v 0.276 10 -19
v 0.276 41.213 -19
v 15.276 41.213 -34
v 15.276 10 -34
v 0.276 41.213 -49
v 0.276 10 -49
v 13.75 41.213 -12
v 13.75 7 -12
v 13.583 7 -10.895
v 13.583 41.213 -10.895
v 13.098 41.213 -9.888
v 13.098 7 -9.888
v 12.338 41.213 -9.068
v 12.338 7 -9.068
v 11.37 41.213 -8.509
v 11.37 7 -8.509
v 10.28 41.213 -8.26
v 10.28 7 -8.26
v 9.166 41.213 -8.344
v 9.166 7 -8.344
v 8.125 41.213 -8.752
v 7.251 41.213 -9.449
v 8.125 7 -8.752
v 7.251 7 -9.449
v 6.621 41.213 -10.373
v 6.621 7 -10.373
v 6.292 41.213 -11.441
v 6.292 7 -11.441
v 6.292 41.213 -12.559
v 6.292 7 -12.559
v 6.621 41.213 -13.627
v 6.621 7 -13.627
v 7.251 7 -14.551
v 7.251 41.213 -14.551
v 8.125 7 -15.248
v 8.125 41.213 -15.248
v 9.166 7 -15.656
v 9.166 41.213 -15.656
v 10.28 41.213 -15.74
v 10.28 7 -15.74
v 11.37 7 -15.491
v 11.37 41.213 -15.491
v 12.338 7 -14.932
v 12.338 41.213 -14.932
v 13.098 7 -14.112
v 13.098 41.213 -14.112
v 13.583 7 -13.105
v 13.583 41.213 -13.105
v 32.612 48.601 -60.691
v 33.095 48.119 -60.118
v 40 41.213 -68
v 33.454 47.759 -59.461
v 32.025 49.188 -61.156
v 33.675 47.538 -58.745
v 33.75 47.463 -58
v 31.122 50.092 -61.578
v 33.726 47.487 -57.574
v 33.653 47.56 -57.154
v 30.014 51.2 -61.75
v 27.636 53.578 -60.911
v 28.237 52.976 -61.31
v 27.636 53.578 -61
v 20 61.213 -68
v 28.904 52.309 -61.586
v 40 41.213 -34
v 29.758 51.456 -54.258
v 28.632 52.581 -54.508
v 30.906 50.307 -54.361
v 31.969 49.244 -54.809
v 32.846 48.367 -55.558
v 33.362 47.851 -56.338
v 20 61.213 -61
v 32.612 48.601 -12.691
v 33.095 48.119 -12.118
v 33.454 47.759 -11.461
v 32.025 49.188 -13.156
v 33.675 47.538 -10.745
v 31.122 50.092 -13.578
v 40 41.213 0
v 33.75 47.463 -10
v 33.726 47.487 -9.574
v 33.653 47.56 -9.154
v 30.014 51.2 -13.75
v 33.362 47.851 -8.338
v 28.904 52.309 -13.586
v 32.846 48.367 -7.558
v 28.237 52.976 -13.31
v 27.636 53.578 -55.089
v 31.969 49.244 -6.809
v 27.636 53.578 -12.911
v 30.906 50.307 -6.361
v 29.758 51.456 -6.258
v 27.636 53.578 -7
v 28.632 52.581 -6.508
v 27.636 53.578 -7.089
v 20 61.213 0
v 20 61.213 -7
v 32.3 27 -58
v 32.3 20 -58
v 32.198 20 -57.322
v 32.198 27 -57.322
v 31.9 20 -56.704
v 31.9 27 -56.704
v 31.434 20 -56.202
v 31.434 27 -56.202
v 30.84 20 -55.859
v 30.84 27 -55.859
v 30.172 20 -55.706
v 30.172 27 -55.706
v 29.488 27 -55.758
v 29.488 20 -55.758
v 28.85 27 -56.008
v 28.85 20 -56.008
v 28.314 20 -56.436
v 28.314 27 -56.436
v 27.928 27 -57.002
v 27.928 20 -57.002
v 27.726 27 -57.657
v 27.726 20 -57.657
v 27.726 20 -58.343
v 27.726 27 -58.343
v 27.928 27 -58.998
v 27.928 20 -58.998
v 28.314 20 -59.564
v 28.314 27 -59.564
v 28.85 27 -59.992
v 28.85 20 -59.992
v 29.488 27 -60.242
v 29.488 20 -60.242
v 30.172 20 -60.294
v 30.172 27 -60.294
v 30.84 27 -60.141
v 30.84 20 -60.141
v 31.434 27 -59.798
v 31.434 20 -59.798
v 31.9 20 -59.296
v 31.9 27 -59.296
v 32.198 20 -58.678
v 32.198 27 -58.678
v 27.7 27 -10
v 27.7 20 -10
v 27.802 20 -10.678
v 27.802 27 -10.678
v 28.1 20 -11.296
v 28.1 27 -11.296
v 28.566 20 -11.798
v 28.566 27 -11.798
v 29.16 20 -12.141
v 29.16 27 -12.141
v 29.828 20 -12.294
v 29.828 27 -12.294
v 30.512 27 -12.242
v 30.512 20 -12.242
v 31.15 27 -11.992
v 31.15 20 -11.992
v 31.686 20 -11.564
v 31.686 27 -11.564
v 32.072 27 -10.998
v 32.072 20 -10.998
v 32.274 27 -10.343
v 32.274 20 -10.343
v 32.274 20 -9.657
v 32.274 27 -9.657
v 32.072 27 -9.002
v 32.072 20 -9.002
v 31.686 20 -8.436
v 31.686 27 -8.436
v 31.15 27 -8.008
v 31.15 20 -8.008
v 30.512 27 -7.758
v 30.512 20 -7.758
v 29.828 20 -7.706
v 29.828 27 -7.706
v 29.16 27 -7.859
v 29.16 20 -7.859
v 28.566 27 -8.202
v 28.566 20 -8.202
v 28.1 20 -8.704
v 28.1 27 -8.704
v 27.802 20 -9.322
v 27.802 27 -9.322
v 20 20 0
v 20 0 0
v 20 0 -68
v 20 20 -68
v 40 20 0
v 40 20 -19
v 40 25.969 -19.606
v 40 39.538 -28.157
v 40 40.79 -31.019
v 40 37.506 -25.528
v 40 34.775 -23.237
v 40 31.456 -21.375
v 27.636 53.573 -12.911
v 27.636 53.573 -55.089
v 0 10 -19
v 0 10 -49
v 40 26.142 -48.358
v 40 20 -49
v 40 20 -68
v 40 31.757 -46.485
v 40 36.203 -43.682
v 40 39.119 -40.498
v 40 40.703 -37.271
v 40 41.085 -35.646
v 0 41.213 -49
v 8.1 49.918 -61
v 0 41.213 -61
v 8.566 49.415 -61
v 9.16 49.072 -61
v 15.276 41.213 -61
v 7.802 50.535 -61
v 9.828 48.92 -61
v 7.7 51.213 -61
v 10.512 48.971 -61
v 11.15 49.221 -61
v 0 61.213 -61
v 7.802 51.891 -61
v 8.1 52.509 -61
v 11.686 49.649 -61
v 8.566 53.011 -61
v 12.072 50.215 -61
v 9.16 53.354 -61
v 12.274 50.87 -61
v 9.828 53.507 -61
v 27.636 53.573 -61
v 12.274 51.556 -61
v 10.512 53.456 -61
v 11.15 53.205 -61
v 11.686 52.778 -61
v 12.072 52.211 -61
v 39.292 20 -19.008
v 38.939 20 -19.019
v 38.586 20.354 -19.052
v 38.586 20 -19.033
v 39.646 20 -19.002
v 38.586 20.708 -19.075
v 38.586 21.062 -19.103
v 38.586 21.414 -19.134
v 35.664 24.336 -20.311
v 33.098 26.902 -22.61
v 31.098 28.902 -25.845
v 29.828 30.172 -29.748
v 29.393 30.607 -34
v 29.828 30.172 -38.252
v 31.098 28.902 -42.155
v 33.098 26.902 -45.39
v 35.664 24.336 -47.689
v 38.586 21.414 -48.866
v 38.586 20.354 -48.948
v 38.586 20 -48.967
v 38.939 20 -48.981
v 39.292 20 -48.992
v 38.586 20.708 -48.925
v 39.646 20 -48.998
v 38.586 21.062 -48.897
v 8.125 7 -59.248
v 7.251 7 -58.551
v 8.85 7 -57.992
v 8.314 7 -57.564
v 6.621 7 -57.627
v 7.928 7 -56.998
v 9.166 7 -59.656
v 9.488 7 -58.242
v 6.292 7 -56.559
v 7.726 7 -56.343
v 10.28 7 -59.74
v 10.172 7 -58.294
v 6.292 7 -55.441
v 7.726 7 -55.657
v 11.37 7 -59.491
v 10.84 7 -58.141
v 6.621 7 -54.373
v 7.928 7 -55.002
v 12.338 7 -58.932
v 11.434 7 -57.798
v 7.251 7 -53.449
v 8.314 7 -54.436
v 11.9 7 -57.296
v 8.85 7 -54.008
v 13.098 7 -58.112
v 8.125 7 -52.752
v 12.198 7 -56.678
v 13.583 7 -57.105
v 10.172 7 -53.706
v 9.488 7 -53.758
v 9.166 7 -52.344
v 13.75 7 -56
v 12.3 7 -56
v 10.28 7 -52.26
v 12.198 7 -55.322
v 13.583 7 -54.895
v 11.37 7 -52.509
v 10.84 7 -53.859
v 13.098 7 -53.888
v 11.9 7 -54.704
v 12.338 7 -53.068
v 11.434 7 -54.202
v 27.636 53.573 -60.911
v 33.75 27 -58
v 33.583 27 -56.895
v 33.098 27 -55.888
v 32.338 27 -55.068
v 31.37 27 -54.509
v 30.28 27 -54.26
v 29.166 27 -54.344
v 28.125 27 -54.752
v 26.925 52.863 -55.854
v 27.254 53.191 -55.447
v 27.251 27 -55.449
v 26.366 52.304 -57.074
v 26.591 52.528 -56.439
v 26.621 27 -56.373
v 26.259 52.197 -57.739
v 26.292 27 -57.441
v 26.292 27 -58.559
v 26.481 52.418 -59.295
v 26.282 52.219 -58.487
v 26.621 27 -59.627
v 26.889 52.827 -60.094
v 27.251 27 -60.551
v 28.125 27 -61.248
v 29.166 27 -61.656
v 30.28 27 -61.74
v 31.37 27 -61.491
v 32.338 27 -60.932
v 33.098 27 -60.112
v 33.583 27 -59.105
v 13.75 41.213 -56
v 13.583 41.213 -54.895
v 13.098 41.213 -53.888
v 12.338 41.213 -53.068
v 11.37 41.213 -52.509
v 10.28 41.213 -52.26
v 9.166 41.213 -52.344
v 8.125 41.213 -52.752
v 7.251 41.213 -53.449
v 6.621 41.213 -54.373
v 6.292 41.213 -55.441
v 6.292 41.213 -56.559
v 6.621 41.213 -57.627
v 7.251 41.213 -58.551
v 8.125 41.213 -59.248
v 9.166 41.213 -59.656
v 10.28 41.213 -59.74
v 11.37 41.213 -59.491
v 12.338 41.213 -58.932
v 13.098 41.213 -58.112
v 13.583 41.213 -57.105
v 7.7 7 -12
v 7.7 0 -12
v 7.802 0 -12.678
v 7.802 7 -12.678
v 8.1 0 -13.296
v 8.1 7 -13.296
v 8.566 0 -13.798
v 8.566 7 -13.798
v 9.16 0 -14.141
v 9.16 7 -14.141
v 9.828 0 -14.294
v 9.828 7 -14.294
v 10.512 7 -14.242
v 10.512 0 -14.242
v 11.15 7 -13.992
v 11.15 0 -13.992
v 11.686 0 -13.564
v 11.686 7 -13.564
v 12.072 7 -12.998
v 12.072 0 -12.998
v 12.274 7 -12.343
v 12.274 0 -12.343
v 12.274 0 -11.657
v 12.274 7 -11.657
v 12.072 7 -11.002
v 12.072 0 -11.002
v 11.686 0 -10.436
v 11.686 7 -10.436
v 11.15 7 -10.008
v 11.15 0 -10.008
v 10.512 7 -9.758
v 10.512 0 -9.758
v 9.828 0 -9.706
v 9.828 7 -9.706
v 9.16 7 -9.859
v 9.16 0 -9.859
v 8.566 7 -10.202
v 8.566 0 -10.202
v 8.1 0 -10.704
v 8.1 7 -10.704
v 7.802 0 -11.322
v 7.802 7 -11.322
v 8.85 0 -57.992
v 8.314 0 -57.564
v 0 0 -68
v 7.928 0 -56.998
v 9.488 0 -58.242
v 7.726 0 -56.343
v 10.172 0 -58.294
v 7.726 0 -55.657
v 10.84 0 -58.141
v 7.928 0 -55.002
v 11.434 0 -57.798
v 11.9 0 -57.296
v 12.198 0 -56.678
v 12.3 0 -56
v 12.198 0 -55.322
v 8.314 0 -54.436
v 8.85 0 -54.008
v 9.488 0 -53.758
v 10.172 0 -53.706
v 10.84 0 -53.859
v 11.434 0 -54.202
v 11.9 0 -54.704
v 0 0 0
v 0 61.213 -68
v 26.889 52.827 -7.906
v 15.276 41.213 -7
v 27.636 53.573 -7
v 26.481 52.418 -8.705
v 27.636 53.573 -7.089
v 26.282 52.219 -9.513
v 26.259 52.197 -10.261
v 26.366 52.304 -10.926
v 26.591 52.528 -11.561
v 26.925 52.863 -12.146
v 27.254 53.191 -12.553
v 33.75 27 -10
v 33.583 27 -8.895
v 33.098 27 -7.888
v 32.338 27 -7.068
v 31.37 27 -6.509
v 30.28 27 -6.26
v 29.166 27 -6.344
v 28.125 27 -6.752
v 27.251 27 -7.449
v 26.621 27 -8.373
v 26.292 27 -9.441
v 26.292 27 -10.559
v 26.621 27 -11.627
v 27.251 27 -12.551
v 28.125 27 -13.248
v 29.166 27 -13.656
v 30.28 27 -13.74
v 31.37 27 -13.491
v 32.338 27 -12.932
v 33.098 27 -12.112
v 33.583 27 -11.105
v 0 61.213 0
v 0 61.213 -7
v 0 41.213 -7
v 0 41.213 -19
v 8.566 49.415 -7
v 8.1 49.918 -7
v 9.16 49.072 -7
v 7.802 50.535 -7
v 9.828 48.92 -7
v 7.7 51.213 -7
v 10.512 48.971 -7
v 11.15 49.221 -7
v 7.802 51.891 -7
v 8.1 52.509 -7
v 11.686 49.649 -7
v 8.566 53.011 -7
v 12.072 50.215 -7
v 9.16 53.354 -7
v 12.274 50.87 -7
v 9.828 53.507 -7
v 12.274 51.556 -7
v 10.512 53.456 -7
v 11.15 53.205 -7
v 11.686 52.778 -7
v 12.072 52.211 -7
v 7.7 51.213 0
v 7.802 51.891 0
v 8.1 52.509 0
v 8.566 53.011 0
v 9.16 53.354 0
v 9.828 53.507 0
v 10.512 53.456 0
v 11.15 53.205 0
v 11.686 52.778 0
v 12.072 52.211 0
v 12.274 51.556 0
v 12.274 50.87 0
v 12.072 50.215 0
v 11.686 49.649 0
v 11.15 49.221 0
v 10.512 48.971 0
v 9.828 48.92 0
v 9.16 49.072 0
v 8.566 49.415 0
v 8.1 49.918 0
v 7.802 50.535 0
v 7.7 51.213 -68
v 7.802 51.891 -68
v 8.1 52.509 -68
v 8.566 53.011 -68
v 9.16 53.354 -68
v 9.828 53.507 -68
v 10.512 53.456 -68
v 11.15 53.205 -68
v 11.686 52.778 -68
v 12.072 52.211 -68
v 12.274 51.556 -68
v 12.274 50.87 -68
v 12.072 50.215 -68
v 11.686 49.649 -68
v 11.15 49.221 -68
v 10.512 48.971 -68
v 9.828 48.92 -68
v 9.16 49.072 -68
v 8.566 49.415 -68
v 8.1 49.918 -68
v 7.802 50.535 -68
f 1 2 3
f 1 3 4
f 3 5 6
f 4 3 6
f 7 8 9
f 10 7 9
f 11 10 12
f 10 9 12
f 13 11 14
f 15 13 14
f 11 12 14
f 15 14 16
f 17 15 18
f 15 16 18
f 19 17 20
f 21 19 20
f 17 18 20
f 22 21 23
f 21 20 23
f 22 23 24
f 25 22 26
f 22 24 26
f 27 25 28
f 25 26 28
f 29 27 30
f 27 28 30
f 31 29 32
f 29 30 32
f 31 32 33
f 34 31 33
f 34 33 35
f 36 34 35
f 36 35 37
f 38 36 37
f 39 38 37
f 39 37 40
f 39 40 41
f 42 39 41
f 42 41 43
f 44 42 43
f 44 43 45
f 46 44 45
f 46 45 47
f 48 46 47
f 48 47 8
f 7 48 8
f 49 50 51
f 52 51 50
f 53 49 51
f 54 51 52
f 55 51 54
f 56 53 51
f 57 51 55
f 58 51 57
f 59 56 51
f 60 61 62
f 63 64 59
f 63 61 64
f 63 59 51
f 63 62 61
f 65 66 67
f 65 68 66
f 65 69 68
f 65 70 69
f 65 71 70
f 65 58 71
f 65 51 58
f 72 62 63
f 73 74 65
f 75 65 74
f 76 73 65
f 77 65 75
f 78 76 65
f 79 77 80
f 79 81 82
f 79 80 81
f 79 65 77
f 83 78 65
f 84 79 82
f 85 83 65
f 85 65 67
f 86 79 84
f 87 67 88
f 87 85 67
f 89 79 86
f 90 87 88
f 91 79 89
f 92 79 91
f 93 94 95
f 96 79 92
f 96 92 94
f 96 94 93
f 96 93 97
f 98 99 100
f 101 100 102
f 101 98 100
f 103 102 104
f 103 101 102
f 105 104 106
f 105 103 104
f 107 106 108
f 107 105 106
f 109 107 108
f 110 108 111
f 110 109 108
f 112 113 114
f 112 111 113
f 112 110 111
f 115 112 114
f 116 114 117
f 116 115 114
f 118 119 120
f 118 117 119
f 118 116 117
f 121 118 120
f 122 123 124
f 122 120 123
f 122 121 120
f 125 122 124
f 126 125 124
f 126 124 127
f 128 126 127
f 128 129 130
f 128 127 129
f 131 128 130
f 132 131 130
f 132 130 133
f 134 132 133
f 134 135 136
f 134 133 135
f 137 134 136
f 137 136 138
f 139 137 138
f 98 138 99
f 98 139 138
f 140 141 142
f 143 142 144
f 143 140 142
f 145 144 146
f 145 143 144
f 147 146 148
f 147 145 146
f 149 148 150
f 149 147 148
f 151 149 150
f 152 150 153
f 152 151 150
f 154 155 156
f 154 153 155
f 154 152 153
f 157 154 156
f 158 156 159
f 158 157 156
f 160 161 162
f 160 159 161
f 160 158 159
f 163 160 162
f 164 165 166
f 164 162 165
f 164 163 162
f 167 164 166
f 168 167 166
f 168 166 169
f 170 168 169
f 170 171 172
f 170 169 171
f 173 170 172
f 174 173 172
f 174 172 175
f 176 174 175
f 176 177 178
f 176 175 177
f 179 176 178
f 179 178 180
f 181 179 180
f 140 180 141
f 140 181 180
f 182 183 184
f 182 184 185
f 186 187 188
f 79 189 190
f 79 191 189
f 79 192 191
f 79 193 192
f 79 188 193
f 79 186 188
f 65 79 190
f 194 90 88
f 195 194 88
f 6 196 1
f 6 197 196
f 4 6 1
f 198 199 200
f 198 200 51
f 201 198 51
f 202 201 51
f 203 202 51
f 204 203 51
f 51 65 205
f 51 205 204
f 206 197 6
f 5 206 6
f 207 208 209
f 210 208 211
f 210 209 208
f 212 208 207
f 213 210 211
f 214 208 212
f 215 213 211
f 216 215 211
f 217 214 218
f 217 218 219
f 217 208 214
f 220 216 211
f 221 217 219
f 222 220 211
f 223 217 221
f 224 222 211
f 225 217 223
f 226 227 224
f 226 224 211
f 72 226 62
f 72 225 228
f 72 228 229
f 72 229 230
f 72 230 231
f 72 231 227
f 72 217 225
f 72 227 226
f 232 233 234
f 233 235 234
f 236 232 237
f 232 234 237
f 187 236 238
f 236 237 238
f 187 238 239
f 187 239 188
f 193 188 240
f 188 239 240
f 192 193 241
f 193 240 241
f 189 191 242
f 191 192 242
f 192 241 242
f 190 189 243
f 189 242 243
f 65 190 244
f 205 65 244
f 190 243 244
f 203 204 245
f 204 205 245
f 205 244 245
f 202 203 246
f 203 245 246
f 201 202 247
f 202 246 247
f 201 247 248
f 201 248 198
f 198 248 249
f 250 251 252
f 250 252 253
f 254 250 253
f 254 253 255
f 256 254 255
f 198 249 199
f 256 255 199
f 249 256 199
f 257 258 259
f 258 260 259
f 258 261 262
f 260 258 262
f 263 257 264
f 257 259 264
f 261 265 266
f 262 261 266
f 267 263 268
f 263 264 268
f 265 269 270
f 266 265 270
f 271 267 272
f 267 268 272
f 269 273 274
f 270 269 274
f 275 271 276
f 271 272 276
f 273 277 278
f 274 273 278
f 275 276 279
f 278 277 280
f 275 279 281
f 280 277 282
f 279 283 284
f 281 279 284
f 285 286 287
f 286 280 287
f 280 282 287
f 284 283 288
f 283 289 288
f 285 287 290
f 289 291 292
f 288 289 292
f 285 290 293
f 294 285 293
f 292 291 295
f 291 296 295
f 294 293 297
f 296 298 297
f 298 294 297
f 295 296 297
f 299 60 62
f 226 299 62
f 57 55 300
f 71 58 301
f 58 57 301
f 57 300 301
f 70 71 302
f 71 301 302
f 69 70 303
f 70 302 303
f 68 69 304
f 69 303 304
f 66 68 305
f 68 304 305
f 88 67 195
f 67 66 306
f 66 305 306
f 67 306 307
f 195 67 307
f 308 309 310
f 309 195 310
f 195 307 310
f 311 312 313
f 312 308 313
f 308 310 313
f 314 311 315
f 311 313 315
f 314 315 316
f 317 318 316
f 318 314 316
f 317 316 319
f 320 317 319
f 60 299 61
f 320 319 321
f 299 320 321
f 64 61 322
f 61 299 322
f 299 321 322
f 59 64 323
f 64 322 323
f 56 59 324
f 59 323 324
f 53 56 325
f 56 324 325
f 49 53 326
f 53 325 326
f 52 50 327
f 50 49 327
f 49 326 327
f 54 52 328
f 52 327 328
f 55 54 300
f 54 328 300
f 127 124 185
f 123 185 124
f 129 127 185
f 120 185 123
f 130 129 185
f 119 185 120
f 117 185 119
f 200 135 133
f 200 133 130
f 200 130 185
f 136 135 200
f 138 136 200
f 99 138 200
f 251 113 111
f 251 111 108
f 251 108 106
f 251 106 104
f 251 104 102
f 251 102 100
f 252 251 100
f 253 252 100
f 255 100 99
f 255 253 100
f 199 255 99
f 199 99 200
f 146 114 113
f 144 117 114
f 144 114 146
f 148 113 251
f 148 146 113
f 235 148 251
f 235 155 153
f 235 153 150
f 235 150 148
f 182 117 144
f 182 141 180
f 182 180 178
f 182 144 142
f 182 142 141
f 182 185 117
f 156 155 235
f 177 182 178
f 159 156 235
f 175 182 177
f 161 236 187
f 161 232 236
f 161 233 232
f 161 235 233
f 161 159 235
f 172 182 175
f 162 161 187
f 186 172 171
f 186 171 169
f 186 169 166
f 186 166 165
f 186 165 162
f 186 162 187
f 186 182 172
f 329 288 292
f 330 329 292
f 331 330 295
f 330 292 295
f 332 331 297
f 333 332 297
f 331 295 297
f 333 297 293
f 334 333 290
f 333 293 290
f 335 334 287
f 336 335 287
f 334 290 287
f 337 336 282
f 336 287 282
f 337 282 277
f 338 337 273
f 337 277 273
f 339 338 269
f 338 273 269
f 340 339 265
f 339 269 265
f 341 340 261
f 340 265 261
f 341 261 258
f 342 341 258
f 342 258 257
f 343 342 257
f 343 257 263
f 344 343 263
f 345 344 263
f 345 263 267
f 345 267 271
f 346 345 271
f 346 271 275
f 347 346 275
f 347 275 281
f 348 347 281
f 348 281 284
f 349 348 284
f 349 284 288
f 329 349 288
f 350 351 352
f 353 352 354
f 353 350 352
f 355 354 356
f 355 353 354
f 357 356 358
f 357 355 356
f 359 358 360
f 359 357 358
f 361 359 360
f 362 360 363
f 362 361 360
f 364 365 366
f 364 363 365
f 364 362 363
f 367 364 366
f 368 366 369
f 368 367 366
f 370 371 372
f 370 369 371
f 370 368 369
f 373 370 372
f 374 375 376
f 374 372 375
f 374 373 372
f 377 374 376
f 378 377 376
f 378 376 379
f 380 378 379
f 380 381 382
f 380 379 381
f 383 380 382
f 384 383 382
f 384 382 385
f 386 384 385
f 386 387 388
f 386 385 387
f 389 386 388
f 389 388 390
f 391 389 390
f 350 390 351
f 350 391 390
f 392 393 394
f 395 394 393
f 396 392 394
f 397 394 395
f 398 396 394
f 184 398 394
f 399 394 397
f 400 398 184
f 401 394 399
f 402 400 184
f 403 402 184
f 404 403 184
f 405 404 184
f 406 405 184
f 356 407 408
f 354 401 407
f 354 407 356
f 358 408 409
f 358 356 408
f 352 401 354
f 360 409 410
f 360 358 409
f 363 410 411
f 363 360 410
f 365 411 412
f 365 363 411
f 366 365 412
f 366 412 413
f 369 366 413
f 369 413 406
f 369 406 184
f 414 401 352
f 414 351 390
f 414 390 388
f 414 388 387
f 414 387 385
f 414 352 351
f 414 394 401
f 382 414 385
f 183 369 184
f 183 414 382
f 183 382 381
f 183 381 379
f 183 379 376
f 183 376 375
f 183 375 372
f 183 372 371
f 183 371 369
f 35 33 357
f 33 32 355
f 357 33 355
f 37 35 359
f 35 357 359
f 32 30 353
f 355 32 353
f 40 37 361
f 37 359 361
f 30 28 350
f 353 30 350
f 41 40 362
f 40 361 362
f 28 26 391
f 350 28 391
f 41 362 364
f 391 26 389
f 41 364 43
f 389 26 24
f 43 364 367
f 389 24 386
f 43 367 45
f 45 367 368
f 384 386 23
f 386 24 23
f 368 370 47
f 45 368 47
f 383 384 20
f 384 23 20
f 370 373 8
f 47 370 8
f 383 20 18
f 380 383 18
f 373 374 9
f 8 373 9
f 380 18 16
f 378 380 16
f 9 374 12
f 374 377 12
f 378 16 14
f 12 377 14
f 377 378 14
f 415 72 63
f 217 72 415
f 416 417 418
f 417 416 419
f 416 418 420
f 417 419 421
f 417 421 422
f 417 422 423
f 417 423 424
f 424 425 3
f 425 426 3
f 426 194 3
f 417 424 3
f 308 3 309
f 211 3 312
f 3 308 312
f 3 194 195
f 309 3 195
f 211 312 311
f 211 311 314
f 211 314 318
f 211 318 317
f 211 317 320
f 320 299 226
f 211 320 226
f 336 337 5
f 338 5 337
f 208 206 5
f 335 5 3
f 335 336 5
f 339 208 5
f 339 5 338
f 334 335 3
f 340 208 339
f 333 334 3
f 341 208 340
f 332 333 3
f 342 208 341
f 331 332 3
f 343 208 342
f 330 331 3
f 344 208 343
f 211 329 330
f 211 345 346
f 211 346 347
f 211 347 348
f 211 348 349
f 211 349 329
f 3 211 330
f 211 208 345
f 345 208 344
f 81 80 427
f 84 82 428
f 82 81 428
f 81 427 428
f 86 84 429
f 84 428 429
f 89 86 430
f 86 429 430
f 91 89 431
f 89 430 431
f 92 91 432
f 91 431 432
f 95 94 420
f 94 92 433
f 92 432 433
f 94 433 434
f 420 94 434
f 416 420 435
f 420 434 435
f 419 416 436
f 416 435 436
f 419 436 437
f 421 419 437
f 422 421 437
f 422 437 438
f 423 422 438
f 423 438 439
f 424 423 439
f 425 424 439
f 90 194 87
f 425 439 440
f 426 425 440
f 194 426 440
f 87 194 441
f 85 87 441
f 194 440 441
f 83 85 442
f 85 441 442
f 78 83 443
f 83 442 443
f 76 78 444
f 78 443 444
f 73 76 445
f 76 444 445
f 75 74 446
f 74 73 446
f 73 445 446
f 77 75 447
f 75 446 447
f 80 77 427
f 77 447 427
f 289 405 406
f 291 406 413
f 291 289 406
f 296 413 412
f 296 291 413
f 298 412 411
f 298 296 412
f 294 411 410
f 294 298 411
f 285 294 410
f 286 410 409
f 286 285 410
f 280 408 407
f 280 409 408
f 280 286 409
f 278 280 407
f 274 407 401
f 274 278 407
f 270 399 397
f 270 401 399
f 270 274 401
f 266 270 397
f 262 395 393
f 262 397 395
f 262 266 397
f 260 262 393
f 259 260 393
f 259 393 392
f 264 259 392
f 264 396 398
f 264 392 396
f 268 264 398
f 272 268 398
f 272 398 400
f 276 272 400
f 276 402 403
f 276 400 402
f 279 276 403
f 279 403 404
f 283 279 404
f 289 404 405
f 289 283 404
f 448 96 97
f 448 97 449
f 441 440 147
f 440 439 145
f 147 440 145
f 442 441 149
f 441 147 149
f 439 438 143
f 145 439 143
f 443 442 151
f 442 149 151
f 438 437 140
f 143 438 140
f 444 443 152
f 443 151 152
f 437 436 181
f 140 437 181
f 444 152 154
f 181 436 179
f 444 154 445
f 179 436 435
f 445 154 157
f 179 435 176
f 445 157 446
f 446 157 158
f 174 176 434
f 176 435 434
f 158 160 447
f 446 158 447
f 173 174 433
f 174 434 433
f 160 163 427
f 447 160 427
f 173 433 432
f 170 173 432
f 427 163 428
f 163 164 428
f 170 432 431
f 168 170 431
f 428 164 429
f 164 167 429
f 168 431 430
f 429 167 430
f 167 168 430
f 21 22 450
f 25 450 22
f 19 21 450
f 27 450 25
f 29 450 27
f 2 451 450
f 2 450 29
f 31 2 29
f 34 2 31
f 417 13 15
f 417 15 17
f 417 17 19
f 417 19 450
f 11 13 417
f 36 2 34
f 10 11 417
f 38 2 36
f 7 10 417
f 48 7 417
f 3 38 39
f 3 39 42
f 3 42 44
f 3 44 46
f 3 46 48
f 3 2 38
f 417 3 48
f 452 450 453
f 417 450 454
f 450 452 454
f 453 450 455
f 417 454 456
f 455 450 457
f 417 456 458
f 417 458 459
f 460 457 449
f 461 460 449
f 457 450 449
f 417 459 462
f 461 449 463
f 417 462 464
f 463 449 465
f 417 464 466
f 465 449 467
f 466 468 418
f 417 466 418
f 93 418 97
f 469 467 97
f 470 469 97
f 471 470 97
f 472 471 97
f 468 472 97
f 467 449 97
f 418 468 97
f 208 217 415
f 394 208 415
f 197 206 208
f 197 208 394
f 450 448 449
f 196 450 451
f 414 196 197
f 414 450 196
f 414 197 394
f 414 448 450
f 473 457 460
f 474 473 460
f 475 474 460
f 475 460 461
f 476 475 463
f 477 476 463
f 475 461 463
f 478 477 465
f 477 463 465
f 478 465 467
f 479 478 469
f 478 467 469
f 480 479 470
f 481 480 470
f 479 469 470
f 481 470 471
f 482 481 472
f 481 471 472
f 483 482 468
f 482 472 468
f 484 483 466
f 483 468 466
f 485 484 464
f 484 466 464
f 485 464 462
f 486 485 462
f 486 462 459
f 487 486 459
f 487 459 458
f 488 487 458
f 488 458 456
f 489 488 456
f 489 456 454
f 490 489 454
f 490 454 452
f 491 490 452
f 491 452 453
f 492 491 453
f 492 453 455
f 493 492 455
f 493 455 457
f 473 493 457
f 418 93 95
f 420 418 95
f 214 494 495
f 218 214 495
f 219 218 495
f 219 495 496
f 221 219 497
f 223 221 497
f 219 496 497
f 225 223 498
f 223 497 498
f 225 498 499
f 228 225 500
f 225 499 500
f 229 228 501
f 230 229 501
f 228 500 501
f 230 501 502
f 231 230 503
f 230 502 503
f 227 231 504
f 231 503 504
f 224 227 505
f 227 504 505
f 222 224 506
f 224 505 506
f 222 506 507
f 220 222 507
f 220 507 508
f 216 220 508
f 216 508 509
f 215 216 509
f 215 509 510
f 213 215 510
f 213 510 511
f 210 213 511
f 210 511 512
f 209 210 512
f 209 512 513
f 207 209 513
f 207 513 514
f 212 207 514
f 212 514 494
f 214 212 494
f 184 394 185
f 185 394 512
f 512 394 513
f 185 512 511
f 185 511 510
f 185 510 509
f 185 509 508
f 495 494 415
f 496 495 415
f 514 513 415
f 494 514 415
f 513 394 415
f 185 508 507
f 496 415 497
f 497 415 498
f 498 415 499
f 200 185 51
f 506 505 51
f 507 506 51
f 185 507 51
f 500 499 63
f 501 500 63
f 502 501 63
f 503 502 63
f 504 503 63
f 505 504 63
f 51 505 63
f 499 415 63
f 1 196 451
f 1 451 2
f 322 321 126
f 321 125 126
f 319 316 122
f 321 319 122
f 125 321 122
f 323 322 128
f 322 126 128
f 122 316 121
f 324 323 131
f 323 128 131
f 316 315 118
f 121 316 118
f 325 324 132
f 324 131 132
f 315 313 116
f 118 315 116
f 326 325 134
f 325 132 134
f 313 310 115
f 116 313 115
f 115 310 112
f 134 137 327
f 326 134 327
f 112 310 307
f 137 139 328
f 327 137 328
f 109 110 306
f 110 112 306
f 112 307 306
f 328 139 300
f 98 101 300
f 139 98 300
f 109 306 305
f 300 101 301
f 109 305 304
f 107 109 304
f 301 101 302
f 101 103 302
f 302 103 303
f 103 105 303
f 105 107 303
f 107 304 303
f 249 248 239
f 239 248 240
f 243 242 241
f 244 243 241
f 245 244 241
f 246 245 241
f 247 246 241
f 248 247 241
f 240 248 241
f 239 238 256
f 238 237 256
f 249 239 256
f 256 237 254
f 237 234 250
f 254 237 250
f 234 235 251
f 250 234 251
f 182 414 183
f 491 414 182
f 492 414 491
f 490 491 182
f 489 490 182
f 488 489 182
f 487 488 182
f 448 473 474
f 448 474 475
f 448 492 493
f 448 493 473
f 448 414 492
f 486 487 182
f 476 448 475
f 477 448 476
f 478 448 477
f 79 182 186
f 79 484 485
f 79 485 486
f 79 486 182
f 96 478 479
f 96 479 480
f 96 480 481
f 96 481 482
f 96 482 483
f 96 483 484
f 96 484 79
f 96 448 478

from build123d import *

# Parameters (mm, degrees)
AUFSATZ_LINEAR_AUSTRAGEN1_DEPTH = 68
SKIZZE4_R                       = 15
SCHNITT_LINEAR_AUSTRAGEN1_DEPTH = 20
SKIZZE9_W                       = 27.635547715
SKIZZE9_H                       = 54
SCHNITT_LINEAR_AUSTRAGEN6_DEPTH = 20
SKIZZE5_R                       = 2.3
SCHNITT_LINEAR_AUSTRAGEN2_DEPTH = 20
SKIZZE6_R                       = 3.75
SCHNITT_LINEAR_AUSTRAGEN3_DEPTH = 96.723933406
SKIZZE7_R                       = 2.3
SCHNITT_LINEAR_AUSTRAGEN4_DEPTH = 20
SKIZZE8_R                       = 3.75
SCHNITT_LINEAR_AUSTRAGEN5_DEPTH = 86.991530335
FASE1_SIZE                      = 12.36
SKIZZE10_W                      = 15.275547715
SKIZZE10_H                      = 30
SCHNITT_LINEAR_AUSTRAGEN7_DEPTH = 31.213203436
FASE2_SIZE                      = 15
SKIZZE12_R                      = 2.3
SCHNITT_LINEAR_AUSTRAGEN8_DEPTH = 100.855176505
FASE3_SIZE                      = 2
FASE3_SIZE2                     = 1.414213562


with BuildPart() as part:
    # Skizze1 → Aufsatz-Linear austragen1 (new body)
    with BuildSketch(Plane.XY):
        Polygon((0, 0), (20, 0), (20, 20), (40, 20), (40, 41.213203436), (20, 61.213203436), (0, 61.213203436), align=None)
    extrude(amount=-AUFSATZ_LINEAR_AUSTRAGEN1_DEPTH)

    # Skizze4 → Schnitt-Linear austragen1 (cut)
    with BuildSketch(Plane(origin=(30, 30, 0), x_dir=(0, 0, 1), z_dir=(-0.7071067811865507, -0.7071067811865445, -1.0200465955922179e-15))):
        with Locations((-34, -14.142135624)):
            Circle(SKIZZE4_R)
    extrude(amount=-SCHNITT_LINEAR_AUSTRAGEN1_DEPTH, mode=Mode.SUBTRACT)

    # Skizze9 → Schnitt-Linear austragen6 (cut)
    with BuildSketch(Plane(origin=(0, 61.213203436, 0), x_dir=(1, 0, 0), z_dir=(0, 1, 0))):
        with Locations((13.817773858, 34)):
            Rectangle(SKIZZE9_W, SKIZZE9_H)
    extrude(amount=-SCHNITT_LINEAR_AUSTRAGEN6_DEPTH, mode=Mode.SUBTRACT)

    # Skizze5 → Schnitt-Linear austragen2 (cut)
    with BuildSketch(Plane(origin=(0, 7, 0), x_dir=(-1, 0, 0), z_dir=(0, -1, 0))):
        with Locations(Location((-10, 56, 0), (0, 0, 180))):
            Circle(SKIZZE5_R)
        with Locations((-10, 12)):
            Circle(SKIZZE5_R)
    extrude(amount=SCHNITT_LINEAR_AUSTRAGEN2_DEPTH, mode=Mode.SUBTRACT)

    # Skizze6 → Schnitt-Linear austragen3 (cut, through all)
    with BuildSketch(Plane(origin=(0, 7, 0), x_dir=(-1, 0, 0), z_dir=(0, -1, 0))):
        with Locations(Location((-10, 56, 0), (0, 0, 180))):
            Circle(SKIZZE6_R)
        with Locations(Location((-10, 12, 0), (0, 0, 180))):
            Circle(SKIZZE6_R)
    extrude(amount=-SCHNITT_LINEAR_AUSTRAGEN3_DEPTH, mode=Mode.SUBTRACT)

    # Skizze7 → Schnitt-Linear austragen4 (cut)
    with BuildSketch(Plane(origin=(0, 27, 0), x_dir=(-1, 0, 0), z_dir=(0, -1, 0))):
        with Locations(Location((-30, 58, 0), (0, 0, 180))):
            Circle(SKIZZE7_R)
        with Locations((-30, 10)):
            Circle(SKIZZE7_R)
    extrude(amount=SCHNITT_LINEAR_AUSTRAGEN4_DEPTH, mode=Mode.SUBTRACT)

    # Skizze8 → Schnitt-Linear austragen5 (cut, through all)
    with BuildSketch(Plane(origin=(0, 27, 0), x_dir=(-1, 0, 0), z_dir=(0, -1, 0))):
        with Locations(Location((-30, 58, 0), (0, 0, 180))):
            Circle(SKIZZE8_R)
        with Locations(Location((-30, 10, 0), (0, 0, 180))):
            Circle(SKIZZE8_R)
    extrude(amount=-SCHNITT_LINEAR_AUSTRAGEN5_DEPTH, mode=Mode.SUBTRACT)

    # Fase1
    fase1_edges = [part.edges().sort_by_distance(p)[0] for p in [
        (27.635547715, 41.213203436, -34),
    ]]
    chamfer(fase1_edges, length=FASE1_SIZE)

    # Skizze10 → Schnitt-Linear austragen7 (cut)
    with BuildSketch(Plane(origin=(0, 41.213203436, 0), x_dir=(1, 0, 0), z_dir=(0, 1, 0))):
        with Locations((7.637773858, 34)):
            Rectangle(SKIZZE10_W, SKIZZE10_H)
    extrude(amount=-SCHNITT_LINEAR_AUSTRAGEN7_DEPTH, mode=Mode.SUBTRACT)

    # Fase2
    fase2_edges = [part.edges().sort_by_distance(p)[0] for p in [
        (15.275547715, 25.606601718, -19),
        (15.275547715, 25.606601718, -49),
    ]]
    chamfer(fase2_edges, length=FASE2_SIZE - 0.0001)  # a hair under: the kernel refuses the full size

    # Skizze12 → Schnitt-Linear austragen8 (cut, through all)
    with BuildSketch(Plane(origin=(0, 0, -68), x_dir=(-1, 0, 0), z_dir=(0, 0, -1))):
        with Locations((-10, 51.213203436)):
            Circle(SKIZZE12_R)
    extrude(amount=-SCHNITT_LINEAR_AUSTRAGEN8_DEPTH, mode=Mode.SUBTRACT)

    # Fase3
    fase3_edges = [part.edges().sort_by_distance(p)[0] for p in [
        (40, 20, -34),
    ]]
    fase3_side = [part.faces().sort_by_distance(p)[0] for p in [
        (35.498418419, 24.501581581, -34),
    ]]
    chamfer(fase3_edges, length=FASE3_SIZE, length2=FASE3_SIZE2, reference=fase3_side[0])


solid = part.part
